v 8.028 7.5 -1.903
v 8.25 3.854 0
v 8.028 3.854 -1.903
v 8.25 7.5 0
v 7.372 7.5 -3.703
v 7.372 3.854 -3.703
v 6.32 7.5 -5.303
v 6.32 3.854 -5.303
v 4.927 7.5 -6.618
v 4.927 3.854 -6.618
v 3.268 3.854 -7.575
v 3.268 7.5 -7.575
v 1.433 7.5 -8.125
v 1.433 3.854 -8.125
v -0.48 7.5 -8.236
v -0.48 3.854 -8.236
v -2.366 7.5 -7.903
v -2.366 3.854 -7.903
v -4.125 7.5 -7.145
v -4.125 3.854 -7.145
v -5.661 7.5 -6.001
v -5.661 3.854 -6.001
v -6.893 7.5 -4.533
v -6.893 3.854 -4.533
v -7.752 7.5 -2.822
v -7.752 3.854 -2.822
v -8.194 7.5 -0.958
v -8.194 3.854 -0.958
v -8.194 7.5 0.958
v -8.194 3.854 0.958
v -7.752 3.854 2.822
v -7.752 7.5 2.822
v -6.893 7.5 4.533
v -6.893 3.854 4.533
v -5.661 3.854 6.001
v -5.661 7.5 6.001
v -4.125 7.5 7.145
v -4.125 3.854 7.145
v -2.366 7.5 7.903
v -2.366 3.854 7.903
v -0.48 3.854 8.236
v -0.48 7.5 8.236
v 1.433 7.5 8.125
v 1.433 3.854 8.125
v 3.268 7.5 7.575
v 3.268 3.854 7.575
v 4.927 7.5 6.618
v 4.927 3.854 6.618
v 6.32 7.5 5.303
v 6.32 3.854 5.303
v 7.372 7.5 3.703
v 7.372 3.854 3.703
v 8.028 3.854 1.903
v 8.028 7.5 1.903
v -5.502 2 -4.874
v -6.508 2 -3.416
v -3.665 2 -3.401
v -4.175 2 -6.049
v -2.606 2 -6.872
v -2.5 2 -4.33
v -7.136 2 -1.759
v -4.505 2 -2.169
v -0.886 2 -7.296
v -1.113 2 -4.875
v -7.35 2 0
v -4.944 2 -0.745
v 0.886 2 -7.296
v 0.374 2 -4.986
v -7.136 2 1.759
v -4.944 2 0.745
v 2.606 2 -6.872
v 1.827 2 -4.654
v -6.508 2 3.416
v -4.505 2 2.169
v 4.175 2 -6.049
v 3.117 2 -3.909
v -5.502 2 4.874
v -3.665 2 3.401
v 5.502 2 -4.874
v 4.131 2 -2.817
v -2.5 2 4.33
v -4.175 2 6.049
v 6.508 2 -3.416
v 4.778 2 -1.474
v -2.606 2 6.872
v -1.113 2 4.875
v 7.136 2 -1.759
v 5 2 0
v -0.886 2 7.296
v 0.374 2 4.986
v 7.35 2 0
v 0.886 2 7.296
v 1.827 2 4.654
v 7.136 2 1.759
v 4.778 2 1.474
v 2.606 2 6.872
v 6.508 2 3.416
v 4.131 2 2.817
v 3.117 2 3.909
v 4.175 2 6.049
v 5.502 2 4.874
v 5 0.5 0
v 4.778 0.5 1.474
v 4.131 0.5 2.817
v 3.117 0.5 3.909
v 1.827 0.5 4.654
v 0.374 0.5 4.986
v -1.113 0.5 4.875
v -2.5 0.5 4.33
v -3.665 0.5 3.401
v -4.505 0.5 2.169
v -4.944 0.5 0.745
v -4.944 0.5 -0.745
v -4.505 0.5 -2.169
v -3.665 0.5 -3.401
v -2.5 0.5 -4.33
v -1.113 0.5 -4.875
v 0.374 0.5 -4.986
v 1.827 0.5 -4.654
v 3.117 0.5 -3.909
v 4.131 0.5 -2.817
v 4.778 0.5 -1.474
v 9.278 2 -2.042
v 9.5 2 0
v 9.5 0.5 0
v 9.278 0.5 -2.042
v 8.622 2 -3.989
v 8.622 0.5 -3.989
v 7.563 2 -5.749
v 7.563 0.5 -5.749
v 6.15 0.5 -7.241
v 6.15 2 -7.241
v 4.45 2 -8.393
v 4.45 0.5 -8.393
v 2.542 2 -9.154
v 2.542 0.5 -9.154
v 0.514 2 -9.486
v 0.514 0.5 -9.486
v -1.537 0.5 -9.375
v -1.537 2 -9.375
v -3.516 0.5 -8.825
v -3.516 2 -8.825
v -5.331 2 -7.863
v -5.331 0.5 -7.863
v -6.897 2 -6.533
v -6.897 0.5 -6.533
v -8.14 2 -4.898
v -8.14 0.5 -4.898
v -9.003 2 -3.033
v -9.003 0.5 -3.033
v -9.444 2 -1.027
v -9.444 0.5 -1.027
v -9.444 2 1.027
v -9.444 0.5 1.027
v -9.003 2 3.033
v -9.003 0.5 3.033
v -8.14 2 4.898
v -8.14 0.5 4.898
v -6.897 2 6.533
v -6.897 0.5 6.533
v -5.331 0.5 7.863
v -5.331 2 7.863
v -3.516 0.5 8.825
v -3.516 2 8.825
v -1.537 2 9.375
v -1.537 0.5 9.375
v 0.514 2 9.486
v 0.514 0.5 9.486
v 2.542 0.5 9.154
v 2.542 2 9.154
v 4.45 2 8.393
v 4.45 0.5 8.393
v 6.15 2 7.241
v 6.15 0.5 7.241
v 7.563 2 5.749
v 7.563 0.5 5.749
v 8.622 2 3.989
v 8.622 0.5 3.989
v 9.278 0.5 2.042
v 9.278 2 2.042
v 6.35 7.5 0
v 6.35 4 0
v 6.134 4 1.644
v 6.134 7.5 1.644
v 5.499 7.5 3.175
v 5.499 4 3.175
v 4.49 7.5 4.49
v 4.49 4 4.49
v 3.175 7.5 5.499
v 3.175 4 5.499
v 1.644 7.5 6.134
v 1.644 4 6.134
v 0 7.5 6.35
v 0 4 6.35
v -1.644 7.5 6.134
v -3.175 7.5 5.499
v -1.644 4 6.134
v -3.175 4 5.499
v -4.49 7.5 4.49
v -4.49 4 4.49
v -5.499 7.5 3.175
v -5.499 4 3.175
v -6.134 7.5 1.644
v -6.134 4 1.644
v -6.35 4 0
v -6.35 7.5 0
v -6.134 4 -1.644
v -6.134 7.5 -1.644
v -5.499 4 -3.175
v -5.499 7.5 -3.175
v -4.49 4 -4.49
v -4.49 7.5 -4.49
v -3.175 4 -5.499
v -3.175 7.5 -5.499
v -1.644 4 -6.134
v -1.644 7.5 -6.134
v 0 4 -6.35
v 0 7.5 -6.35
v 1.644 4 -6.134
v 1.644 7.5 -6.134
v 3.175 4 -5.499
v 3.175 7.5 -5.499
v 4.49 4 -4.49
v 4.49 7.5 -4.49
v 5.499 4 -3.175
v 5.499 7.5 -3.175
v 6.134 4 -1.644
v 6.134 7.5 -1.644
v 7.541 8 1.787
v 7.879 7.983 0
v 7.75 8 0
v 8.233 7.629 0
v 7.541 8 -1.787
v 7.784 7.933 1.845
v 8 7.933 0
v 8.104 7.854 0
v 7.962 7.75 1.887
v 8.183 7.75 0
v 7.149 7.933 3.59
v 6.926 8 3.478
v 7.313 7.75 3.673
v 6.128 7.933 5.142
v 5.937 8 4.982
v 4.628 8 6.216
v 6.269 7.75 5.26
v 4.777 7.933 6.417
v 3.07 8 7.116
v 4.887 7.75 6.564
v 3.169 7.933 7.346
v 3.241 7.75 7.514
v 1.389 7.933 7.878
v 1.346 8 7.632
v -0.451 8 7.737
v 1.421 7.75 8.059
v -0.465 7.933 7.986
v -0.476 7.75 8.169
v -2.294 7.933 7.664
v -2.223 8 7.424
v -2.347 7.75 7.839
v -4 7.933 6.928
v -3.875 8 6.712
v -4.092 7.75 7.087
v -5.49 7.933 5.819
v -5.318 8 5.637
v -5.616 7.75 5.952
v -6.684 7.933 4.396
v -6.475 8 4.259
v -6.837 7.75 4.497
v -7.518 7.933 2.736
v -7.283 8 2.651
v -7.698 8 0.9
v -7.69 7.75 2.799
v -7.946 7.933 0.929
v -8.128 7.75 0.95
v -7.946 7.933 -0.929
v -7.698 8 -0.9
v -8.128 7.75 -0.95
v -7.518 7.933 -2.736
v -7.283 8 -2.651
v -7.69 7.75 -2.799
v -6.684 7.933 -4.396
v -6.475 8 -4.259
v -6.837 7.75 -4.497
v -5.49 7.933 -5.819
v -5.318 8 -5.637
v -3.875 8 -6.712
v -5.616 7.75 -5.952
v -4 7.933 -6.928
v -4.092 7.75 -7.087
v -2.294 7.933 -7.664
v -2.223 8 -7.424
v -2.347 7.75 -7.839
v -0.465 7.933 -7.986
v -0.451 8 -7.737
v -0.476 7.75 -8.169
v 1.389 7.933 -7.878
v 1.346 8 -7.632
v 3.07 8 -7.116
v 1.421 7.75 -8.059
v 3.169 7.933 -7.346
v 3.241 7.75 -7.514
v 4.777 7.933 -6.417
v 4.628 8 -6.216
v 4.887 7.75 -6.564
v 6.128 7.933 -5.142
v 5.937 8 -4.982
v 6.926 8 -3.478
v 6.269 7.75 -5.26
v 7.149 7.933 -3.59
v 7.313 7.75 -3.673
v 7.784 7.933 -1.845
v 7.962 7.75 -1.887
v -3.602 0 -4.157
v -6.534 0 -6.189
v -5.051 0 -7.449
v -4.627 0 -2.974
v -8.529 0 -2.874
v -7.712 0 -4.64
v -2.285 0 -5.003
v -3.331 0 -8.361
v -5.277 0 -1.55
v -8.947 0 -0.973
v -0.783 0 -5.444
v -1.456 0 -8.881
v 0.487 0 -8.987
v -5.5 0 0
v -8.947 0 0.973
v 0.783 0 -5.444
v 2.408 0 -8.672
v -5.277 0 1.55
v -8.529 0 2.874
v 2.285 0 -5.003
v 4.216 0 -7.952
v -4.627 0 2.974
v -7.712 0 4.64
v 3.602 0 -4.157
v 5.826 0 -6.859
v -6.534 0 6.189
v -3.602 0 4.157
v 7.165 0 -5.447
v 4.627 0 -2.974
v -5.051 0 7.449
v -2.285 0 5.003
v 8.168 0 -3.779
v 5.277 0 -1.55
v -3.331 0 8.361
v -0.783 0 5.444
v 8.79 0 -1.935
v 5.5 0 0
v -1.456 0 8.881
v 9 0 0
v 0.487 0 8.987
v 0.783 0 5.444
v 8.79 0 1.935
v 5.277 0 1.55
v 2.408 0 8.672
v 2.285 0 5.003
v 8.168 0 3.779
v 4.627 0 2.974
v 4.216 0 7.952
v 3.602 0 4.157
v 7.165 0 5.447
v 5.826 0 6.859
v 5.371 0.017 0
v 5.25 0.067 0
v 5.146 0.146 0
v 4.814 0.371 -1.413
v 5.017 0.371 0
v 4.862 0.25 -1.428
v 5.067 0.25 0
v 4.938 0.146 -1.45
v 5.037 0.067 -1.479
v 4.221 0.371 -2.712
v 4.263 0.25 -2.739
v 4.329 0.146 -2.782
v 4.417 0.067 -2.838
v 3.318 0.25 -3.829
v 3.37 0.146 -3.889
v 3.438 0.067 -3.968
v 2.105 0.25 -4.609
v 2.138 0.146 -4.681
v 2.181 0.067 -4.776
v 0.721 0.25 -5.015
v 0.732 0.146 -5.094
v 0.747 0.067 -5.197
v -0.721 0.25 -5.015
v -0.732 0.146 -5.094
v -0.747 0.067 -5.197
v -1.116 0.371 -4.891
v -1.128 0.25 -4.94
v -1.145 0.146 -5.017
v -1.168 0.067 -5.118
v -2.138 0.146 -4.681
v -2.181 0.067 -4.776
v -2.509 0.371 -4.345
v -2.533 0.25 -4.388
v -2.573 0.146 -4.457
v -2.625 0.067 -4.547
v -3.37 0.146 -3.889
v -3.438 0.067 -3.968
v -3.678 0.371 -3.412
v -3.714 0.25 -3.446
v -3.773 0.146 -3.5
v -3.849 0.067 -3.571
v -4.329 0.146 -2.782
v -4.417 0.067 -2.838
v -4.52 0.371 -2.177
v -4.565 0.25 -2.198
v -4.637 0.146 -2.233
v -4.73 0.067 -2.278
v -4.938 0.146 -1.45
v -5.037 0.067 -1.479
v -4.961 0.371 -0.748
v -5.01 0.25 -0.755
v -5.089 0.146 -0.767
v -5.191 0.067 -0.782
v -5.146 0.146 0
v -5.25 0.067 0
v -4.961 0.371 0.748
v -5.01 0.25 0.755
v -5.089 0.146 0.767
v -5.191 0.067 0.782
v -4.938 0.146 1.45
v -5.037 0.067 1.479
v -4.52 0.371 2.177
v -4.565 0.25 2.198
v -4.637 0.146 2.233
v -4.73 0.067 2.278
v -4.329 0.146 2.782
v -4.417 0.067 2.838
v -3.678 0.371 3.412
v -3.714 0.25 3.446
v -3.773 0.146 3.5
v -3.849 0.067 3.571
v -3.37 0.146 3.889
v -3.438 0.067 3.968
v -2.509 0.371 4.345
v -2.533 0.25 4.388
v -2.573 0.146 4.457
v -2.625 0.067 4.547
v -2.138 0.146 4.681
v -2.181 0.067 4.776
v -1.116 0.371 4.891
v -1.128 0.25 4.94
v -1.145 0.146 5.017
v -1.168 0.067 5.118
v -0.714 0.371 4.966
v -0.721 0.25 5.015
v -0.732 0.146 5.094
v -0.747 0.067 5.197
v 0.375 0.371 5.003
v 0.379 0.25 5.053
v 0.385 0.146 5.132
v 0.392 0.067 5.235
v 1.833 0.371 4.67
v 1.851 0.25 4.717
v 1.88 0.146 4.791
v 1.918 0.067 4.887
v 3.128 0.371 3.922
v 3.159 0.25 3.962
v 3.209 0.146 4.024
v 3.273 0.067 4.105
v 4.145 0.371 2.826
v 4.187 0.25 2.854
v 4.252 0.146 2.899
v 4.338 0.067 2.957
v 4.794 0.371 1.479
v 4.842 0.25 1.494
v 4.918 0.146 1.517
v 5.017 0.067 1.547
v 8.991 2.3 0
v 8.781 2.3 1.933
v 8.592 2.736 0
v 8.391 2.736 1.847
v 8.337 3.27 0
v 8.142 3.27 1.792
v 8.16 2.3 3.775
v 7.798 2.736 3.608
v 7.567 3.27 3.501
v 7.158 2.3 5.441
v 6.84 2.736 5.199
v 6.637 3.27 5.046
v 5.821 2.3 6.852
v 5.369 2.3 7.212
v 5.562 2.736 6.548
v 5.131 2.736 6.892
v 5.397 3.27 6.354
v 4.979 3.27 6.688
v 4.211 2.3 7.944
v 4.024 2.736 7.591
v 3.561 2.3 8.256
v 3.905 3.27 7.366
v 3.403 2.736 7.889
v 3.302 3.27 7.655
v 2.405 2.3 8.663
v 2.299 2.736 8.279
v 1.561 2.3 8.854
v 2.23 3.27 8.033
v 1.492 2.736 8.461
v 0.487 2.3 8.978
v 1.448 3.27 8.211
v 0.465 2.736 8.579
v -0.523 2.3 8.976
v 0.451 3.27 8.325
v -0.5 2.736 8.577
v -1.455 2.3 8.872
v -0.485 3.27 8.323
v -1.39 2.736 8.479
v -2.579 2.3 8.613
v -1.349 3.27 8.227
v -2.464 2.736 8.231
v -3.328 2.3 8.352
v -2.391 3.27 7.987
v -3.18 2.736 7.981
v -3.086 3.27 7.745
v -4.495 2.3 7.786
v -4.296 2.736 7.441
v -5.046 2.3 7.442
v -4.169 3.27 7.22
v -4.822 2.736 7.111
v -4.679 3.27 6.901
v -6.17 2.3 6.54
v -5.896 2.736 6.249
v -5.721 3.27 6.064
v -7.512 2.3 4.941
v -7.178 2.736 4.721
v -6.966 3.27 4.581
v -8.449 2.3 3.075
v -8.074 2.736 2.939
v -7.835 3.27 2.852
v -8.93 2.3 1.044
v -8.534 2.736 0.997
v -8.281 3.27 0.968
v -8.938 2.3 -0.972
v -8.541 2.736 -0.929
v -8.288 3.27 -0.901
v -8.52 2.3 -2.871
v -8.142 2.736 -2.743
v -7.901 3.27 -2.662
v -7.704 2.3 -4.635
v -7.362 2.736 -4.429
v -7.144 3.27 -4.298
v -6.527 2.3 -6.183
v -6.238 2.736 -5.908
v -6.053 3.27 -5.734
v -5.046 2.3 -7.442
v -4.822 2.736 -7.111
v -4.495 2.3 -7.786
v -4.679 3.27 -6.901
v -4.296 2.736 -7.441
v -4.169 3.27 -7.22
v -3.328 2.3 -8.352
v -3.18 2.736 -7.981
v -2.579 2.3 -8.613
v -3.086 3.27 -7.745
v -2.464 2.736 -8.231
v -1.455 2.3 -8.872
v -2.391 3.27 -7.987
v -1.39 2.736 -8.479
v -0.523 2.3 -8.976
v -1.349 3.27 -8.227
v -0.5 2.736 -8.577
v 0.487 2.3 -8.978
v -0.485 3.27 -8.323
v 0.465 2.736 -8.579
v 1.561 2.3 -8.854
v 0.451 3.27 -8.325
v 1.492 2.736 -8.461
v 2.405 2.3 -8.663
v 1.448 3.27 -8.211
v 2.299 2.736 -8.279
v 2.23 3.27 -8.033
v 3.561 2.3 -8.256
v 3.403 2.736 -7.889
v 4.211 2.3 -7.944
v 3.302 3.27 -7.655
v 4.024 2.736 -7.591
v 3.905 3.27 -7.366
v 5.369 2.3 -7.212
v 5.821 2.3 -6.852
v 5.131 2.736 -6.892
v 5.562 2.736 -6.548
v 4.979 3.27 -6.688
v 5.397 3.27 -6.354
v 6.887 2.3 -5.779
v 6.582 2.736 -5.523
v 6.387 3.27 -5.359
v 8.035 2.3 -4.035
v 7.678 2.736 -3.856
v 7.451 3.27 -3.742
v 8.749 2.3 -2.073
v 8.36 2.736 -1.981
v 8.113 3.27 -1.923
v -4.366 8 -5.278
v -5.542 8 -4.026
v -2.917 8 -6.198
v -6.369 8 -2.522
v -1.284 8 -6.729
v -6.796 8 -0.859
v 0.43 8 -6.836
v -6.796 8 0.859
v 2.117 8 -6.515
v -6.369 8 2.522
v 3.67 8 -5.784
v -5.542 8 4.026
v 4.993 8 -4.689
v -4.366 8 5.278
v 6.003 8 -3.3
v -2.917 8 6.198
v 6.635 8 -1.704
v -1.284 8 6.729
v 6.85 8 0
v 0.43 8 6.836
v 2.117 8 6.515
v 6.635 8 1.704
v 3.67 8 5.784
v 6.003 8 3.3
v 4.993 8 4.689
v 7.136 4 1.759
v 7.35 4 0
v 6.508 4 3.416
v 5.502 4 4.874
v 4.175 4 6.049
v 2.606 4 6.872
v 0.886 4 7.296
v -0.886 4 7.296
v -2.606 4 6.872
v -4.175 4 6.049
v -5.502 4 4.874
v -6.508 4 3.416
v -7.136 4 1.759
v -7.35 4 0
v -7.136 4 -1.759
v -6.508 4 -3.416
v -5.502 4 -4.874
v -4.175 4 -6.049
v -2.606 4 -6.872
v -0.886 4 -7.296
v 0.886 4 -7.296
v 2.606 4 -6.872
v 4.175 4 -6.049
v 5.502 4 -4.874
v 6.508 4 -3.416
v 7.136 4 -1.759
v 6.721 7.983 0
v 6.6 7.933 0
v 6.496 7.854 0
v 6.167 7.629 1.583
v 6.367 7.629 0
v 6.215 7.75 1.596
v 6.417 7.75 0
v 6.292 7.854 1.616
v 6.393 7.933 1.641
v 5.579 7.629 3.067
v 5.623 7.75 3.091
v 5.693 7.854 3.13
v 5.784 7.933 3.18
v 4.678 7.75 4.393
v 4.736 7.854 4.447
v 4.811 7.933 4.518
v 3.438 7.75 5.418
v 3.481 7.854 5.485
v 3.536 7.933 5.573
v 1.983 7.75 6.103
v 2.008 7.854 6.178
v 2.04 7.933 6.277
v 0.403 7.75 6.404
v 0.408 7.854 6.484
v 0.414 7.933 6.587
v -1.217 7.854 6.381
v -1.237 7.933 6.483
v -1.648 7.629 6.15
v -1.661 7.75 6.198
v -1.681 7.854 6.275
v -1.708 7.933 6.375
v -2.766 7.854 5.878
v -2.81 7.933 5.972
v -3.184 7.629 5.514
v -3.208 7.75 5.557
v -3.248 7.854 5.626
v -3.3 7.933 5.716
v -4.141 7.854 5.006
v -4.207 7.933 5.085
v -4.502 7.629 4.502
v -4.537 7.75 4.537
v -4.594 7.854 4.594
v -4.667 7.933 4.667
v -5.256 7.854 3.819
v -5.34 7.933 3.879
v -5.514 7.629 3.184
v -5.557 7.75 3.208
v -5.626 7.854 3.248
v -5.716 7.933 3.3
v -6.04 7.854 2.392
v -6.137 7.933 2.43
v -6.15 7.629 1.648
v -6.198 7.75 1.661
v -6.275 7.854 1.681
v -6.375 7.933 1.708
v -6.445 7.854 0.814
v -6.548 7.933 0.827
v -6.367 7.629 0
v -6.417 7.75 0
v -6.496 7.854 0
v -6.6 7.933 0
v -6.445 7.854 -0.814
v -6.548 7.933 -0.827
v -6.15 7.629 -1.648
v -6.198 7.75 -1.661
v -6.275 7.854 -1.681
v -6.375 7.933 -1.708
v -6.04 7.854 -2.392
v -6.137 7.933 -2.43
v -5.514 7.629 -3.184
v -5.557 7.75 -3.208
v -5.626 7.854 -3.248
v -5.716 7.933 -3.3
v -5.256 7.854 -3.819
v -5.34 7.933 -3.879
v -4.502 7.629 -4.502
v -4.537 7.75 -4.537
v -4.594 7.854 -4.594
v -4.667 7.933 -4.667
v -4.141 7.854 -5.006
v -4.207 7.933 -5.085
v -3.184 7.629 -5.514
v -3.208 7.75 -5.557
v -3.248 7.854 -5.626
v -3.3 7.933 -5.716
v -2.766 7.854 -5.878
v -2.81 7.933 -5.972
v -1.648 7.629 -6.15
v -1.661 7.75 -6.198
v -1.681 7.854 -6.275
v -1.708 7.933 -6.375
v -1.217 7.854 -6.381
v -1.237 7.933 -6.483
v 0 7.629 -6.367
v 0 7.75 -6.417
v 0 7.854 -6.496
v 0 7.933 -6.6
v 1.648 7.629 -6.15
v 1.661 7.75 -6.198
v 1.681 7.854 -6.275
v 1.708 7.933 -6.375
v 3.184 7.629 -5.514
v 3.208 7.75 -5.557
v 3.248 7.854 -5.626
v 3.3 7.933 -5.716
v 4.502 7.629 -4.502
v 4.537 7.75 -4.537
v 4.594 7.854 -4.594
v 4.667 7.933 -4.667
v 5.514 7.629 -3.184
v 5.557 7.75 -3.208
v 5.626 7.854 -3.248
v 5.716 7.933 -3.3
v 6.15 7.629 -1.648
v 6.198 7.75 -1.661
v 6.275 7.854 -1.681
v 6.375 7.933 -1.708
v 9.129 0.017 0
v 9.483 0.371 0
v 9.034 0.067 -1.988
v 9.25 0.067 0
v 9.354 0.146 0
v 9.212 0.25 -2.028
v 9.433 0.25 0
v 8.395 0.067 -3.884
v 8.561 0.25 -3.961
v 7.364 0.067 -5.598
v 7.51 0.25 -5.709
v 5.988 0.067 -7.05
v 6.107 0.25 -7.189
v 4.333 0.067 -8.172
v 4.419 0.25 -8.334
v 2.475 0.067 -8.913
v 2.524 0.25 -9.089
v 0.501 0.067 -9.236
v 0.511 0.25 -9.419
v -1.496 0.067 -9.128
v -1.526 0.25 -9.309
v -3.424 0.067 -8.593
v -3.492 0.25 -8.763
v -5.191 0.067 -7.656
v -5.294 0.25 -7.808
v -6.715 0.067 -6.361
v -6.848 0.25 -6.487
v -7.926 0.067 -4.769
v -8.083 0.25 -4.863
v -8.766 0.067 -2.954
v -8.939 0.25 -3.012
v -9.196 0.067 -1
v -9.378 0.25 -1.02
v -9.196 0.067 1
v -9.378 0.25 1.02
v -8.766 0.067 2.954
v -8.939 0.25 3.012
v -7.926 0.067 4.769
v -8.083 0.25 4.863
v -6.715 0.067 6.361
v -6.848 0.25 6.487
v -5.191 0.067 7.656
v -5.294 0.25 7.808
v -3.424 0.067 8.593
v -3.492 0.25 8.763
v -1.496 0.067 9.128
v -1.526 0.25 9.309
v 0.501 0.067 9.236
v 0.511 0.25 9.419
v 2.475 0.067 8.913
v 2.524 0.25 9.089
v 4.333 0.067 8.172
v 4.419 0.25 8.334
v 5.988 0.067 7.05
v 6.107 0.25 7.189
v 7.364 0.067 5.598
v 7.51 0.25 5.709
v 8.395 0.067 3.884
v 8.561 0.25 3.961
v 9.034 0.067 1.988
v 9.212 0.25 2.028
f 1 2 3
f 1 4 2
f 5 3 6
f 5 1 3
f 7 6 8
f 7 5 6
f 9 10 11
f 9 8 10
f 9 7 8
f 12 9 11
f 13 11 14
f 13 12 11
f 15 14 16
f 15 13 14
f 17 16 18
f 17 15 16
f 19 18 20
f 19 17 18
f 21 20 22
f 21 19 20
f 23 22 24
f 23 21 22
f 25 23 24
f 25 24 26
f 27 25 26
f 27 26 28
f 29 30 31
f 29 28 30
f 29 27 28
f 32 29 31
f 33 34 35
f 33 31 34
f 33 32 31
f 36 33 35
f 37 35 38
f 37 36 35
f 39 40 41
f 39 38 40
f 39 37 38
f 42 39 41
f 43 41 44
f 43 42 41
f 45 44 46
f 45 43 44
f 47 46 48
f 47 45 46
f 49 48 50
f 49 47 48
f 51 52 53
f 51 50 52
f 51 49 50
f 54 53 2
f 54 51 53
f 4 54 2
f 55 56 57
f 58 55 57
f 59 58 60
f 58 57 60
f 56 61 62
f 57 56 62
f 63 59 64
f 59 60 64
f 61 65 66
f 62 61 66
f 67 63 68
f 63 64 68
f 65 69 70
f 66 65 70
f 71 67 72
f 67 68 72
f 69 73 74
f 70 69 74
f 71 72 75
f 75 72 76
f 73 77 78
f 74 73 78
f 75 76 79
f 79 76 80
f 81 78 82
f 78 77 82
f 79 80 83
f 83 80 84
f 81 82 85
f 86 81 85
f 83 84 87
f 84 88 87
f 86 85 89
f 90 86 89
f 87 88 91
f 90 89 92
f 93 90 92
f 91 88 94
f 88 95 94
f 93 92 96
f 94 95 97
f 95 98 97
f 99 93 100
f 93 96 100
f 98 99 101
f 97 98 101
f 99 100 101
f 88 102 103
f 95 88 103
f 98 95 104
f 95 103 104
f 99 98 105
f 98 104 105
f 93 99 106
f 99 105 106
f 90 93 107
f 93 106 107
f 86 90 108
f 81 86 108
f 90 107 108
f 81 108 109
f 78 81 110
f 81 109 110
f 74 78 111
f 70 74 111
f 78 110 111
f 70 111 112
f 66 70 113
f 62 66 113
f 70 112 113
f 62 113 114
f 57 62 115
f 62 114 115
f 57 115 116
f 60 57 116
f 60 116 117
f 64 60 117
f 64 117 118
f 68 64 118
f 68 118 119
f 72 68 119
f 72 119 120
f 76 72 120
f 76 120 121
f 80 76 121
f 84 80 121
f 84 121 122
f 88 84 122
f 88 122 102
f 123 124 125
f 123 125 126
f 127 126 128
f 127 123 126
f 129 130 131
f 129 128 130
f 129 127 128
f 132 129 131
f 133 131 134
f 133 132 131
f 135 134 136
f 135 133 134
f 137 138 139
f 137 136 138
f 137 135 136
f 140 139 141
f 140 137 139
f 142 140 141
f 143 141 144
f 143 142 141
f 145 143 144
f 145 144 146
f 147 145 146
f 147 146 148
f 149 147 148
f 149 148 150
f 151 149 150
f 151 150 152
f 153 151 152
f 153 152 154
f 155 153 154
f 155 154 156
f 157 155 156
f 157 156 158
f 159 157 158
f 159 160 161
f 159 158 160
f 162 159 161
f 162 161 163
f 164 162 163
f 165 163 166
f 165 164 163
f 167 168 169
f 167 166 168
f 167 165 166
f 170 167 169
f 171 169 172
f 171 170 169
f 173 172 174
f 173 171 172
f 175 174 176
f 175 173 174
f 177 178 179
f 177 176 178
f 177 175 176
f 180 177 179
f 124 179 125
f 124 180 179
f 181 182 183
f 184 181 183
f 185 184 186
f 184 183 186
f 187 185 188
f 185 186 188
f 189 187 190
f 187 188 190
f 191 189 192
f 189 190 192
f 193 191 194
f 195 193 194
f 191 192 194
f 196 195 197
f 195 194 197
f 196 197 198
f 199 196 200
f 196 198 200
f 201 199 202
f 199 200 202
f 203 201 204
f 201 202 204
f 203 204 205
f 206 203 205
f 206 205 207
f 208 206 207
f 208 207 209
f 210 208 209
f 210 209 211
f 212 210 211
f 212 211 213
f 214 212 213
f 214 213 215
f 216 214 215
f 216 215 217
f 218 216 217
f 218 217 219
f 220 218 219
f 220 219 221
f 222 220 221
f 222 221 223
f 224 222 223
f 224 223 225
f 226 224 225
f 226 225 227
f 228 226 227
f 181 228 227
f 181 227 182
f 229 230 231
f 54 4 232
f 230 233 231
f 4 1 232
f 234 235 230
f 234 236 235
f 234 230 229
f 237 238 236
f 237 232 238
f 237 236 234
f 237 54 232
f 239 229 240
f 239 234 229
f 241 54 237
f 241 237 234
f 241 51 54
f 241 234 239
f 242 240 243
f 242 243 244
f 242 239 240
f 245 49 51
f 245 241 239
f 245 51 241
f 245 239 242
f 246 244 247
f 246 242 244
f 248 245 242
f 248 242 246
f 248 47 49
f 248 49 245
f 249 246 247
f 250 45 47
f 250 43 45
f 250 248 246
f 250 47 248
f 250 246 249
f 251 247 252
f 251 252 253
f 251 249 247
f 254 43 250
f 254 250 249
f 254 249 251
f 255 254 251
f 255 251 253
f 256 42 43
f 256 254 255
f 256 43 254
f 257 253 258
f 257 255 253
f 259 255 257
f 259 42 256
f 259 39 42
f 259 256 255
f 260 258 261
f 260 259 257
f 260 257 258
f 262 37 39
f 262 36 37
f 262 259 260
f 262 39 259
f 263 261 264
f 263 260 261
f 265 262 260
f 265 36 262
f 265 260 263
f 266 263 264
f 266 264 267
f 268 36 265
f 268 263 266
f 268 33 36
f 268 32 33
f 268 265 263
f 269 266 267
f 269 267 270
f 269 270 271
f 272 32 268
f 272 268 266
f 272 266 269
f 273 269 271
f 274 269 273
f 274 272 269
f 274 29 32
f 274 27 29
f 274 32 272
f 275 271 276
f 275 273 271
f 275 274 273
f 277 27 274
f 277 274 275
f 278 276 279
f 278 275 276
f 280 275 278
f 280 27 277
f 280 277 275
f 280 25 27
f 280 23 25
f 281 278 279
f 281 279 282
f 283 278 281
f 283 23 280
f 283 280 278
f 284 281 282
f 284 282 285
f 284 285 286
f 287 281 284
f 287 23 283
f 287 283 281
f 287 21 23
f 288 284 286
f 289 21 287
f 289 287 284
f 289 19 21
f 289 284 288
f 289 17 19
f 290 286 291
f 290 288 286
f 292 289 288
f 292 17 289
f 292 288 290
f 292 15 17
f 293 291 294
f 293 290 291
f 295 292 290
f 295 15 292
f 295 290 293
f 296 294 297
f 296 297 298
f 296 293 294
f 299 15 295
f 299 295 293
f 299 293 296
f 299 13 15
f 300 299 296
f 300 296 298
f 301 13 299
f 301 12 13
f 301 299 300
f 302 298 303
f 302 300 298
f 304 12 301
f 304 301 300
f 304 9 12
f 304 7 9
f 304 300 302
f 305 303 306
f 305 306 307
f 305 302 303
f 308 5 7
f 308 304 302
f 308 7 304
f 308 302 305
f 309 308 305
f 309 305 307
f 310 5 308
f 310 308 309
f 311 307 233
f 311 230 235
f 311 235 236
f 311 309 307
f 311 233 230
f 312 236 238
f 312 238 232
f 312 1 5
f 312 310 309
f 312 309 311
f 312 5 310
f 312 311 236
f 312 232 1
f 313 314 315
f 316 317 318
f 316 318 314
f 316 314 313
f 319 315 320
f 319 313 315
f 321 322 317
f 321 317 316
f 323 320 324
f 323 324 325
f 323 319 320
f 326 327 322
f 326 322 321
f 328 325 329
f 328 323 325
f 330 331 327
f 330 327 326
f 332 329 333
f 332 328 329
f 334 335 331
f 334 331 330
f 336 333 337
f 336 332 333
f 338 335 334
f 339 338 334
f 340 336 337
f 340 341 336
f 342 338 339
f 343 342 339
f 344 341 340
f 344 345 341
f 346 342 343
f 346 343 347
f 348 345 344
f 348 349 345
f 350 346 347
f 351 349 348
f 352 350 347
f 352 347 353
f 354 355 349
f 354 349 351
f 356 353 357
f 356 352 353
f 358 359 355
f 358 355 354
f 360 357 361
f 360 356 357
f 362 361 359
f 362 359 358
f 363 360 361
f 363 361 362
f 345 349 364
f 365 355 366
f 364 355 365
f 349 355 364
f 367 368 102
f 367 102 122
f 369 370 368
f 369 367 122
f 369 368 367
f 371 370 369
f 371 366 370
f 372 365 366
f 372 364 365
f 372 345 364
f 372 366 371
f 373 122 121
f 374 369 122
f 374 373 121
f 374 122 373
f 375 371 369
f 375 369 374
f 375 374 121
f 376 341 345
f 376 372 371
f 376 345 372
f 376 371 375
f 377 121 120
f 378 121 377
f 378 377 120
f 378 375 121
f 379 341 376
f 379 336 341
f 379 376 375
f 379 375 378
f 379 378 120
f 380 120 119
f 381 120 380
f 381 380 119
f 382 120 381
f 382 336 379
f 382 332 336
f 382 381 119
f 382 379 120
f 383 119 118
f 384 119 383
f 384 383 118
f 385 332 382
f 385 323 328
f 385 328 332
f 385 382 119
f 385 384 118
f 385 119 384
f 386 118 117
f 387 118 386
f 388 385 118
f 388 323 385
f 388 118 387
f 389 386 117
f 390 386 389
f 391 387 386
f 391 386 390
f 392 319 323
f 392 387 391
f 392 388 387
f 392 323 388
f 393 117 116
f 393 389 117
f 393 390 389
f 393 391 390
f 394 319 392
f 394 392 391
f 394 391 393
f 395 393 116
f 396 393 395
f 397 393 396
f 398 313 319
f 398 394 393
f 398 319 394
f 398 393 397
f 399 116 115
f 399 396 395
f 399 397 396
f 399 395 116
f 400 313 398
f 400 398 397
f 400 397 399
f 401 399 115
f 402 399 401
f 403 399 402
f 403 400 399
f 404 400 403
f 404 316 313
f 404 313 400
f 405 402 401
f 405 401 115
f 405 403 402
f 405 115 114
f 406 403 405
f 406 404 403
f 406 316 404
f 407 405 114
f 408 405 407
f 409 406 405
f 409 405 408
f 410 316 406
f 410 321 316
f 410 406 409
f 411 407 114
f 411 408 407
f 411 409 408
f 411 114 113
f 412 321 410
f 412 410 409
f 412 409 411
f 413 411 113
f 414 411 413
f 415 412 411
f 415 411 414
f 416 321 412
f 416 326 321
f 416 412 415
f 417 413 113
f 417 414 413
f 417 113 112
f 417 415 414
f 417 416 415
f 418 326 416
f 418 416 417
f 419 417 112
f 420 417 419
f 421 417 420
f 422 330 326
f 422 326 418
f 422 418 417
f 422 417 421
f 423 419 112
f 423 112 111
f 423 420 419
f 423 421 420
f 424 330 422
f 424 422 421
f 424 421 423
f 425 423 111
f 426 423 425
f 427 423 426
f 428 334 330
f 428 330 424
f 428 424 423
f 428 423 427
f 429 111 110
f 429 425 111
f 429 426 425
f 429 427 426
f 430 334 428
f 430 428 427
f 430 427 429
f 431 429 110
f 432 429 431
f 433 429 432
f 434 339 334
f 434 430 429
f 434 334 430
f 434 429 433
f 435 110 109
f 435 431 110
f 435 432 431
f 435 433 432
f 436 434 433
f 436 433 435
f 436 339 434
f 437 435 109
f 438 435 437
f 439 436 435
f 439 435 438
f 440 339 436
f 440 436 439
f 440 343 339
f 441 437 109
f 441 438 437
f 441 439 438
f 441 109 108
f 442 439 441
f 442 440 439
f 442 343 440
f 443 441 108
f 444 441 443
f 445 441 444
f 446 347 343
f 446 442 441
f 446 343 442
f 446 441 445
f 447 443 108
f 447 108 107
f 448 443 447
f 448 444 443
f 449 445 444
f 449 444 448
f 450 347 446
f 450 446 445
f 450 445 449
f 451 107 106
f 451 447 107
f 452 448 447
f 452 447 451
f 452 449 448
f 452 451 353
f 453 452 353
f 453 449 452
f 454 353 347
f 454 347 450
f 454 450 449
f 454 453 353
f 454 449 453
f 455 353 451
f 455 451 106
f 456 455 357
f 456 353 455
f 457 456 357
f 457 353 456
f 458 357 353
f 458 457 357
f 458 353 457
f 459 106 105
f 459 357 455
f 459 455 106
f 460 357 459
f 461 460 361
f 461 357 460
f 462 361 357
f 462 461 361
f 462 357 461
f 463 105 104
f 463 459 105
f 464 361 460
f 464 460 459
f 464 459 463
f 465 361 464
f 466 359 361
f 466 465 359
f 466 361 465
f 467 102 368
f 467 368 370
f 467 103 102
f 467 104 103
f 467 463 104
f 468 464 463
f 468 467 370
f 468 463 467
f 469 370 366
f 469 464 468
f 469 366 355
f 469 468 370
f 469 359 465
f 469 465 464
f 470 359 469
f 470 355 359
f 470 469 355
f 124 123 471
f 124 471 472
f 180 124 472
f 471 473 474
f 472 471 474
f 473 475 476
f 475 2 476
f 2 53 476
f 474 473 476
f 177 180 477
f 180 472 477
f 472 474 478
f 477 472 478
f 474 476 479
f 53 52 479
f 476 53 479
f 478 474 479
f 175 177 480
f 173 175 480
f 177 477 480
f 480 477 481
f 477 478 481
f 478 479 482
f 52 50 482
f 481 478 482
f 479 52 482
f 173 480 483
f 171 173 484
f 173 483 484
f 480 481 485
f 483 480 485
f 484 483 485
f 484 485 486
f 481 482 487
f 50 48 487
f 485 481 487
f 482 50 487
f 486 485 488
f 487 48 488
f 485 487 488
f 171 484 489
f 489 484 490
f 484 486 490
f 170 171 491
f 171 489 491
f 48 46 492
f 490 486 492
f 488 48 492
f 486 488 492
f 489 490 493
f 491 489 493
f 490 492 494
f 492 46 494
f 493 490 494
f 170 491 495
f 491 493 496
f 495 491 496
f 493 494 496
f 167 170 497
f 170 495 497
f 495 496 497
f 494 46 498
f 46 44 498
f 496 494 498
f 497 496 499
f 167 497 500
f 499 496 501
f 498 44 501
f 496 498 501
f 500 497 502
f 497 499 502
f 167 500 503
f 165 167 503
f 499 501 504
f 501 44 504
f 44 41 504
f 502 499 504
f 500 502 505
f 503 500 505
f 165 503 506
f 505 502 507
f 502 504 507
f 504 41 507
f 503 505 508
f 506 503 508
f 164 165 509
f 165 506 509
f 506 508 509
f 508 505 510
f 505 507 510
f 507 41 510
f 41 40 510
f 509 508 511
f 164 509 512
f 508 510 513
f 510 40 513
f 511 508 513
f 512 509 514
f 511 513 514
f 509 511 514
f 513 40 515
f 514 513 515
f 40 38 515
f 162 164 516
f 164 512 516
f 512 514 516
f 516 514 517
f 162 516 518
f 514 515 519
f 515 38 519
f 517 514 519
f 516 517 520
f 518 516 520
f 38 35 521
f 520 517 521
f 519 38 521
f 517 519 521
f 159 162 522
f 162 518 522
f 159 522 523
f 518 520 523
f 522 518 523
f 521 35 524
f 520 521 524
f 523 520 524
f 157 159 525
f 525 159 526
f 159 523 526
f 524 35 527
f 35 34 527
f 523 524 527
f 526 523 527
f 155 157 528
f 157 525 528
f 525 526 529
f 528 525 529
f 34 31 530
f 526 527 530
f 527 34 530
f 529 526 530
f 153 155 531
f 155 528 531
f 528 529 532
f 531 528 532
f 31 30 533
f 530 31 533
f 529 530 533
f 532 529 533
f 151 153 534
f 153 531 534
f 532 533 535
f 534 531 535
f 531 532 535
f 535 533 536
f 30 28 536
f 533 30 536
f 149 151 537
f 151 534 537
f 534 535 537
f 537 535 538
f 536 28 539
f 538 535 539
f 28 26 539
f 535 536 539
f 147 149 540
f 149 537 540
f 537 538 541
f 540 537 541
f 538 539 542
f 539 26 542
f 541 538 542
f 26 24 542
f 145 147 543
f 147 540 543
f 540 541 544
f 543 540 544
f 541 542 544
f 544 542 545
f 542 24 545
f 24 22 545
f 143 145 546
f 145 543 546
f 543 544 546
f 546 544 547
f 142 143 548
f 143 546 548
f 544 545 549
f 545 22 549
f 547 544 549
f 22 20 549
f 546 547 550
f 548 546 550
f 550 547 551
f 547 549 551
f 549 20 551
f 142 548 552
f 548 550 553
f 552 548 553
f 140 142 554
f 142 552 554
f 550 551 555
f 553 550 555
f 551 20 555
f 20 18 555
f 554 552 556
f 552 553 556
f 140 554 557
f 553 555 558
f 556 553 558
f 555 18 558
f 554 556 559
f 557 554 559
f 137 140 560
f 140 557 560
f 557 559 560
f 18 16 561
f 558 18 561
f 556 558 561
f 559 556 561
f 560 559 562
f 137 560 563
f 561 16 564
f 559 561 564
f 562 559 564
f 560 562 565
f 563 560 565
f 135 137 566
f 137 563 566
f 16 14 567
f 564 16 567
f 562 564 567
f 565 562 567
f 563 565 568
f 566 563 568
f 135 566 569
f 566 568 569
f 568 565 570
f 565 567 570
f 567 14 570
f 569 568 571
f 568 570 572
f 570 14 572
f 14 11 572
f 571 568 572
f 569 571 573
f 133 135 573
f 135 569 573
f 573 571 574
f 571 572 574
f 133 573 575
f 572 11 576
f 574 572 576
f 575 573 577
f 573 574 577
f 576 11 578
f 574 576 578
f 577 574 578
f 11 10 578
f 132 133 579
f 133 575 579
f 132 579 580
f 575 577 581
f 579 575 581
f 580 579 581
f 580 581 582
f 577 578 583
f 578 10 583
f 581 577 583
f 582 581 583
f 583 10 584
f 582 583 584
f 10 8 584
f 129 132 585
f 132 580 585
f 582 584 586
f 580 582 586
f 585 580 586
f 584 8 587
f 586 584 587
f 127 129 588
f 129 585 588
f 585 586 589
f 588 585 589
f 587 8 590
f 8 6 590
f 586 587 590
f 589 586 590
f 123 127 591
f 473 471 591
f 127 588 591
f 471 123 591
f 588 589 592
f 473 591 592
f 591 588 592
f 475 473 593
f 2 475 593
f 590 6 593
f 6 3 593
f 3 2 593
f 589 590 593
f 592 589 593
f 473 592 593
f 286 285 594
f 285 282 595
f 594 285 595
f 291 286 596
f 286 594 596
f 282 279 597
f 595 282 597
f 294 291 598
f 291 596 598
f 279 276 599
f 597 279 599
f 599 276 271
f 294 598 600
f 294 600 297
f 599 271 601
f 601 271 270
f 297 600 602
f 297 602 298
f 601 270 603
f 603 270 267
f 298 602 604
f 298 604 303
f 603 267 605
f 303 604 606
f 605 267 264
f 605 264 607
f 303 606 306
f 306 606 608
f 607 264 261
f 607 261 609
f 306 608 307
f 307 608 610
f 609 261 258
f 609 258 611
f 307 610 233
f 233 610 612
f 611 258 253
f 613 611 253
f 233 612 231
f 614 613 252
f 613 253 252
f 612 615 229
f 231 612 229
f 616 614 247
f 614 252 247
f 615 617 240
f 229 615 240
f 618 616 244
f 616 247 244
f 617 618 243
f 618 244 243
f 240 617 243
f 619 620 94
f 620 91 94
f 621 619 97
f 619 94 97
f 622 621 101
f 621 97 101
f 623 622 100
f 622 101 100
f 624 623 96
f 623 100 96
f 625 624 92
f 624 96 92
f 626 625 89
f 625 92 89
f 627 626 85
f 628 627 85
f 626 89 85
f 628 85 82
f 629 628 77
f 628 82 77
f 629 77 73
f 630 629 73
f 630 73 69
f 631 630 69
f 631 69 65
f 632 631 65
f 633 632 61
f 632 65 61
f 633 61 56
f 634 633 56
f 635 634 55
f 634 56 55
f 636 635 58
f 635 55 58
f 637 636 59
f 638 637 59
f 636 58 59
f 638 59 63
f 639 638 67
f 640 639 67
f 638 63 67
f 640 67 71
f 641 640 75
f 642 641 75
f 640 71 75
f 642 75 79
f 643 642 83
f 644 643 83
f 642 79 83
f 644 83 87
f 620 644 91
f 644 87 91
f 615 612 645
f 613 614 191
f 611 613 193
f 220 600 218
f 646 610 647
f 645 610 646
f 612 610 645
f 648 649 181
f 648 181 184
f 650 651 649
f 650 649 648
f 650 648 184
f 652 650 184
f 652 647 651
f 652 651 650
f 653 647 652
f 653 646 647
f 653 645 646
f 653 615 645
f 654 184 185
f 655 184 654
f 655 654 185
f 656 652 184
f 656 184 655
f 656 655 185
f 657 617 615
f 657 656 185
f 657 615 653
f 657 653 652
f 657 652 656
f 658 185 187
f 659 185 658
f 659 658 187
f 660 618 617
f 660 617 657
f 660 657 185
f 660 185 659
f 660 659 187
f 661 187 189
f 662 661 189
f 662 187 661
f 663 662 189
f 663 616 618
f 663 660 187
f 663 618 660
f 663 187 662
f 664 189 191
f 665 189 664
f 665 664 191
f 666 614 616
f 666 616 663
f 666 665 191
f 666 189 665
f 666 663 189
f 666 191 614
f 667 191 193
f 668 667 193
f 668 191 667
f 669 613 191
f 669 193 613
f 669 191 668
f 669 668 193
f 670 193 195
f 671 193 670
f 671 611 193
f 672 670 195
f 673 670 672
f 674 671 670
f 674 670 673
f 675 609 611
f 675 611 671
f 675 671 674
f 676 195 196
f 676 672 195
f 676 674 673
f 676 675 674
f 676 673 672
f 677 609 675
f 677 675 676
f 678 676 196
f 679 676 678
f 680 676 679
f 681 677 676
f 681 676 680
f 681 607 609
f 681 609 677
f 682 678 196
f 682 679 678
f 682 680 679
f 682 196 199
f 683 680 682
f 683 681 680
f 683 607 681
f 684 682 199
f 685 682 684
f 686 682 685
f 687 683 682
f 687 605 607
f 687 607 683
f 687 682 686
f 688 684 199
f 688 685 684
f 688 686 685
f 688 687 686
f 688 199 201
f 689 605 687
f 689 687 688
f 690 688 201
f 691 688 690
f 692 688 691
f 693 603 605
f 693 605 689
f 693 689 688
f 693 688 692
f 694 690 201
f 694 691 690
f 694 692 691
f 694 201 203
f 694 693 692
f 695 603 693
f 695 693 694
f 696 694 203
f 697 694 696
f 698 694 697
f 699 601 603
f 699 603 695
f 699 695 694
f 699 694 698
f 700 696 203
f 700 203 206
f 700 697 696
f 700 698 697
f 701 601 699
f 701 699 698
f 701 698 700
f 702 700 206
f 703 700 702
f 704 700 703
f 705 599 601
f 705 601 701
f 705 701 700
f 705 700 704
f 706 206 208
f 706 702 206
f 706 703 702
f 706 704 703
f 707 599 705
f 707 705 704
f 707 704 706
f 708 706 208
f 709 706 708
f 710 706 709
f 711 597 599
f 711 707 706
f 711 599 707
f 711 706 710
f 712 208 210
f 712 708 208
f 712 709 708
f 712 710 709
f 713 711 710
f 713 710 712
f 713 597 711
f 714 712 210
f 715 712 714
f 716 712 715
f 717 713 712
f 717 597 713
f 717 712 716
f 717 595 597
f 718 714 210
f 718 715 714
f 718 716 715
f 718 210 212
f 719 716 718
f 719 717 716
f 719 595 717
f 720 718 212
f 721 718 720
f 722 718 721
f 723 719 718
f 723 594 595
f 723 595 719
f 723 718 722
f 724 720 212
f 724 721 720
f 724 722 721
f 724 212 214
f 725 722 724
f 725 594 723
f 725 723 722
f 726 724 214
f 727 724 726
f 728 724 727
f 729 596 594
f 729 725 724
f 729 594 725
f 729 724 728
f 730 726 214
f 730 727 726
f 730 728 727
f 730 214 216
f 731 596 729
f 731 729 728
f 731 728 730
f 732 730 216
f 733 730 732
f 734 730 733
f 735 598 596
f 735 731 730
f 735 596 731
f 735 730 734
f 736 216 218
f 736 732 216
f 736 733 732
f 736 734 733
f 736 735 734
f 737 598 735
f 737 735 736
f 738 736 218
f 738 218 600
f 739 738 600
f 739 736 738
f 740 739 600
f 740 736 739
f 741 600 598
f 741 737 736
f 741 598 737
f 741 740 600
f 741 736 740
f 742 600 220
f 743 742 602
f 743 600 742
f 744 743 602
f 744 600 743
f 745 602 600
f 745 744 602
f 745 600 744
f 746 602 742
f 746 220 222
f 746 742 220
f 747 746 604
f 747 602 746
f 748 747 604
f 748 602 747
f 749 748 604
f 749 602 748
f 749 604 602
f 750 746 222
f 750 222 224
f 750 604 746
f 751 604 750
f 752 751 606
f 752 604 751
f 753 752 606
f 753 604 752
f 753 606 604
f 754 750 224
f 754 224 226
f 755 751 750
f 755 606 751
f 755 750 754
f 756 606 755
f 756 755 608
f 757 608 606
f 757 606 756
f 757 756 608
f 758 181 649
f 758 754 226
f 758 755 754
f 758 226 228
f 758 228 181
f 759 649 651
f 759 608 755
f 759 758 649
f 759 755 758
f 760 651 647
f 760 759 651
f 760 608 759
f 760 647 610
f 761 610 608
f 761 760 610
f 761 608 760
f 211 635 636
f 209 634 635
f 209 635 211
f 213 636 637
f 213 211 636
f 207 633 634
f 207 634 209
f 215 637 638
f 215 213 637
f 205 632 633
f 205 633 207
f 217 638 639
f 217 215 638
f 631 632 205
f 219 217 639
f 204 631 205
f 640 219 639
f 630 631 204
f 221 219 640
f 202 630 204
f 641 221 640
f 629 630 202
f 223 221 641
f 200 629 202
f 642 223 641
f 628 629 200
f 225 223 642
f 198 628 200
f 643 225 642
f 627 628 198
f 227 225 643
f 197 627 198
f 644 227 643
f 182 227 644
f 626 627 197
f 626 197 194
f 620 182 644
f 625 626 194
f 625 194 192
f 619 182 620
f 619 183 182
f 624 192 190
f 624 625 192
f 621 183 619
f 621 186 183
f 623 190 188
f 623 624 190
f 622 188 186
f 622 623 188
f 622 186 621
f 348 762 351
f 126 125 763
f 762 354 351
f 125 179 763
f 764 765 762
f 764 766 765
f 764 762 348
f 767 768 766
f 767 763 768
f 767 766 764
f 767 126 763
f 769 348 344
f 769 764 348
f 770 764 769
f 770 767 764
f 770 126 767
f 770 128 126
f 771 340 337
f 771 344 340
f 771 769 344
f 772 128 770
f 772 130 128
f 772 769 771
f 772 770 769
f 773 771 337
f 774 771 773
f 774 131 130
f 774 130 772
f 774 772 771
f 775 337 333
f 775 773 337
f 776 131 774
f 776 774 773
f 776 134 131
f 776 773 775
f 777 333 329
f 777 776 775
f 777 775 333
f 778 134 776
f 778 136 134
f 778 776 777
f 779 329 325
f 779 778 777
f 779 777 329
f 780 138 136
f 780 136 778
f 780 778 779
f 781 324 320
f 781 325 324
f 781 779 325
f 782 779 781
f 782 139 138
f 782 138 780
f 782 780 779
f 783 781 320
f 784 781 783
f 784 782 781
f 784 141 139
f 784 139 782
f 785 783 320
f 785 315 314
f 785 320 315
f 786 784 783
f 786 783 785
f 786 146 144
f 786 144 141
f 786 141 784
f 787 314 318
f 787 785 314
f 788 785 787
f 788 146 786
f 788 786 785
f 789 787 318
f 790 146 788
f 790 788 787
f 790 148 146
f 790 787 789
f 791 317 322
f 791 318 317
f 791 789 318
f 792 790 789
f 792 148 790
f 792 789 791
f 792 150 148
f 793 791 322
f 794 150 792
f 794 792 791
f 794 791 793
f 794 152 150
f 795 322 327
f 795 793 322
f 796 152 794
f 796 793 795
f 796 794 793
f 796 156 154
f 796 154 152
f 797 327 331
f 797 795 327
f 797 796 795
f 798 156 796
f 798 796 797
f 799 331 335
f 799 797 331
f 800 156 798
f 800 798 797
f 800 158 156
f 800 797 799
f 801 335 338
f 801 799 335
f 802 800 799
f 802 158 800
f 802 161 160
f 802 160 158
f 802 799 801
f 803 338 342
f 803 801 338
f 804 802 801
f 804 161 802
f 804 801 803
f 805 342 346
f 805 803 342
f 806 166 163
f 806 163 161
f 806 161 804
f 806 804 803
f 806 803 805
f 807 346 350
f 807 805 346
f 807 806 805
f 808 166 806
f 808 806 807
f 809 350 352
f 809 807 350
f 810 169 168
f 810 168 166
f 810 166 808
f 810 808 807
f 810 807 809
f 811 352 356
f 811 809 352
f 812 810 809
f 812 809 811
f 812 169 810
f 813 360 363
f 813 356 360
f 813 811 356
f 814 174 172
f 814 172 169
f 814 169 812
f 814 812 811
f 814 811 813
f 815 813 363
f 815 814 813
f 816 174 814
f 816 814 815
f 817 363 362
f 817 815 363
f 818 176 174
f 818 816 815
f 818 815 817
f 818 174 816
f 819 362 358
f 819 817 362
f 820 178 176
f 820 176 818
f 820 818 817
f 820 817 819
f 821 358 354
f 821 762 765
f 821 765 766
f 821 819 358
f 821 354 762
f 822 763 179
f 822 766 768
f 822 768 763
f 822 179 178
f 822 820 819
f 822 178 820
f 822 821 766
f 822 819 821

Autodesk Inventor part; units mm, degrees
ref_plane "YZ Plane" through (0, 0, 0) normal (1, 0, 0) x (0, 1, 0)
ref_plane "XZ Plane" through (0, 0, 0) normal (0, 1, 0) x (-1, 0, 0)
ref_plane "XY Plane" through (0, 0, 0) normal (0, 0, 1) x (1, 0, 0)
sketch "Sketch1" plane through (0, 0, 0) normal (0, 0, 1) x (1, 0, 0)
  line L0 (0, 10.7366) -> (0, -7.1166)
  line L1 (0, 0) -> (9.5, 0)
  line L2 (9.5, 0) -> (9.5, 2)
  line L3 (9.5, 2) -> (8.25, 2)
  line L4 (8.25, 2) -> (8.25, 8)
  line L5 (8.25, 8) -> (6.35, 8)
  line L6 (6.35, 8) -> (6.35, 2)
  line L7 (6.35, 2) -> (0, 2)
  dimension "d0" = 19
  dimension "d1" = 12.7
  dimension "d2" = 1.9
  dimension "d3" = 2
  dimension "d6" = 6
revolve "Revolution1" add sketch "Sketch1" angle 360 about axis through (0, 10.7366, 0) along (0, -1, 0)
sketch "Sketch2" plane through (0, 0, 0) normal (0, 0, 1) x (1, 0, 0)
  line L0 (6.1122, 2) -> (7.35, 2)
  line L1 (8.25, 8) -> (8.25, 2)
  line L2 (7.35, 4) -> (6.1122, 4)
  line L3 (6.1122, 4) -> (6.1122, 2)
  line L4 (8.25, 3) -> (8.25, 4)
  line L5 (-8.25, 8) -> (8.25, 8) projected
  line L6 (0, 5.3477) -> (0, 2.8187)
  line L7 (7.35, 4) -> (7.35, 2)
  point P0 (0, 0)
  dimension "d7" = 4
  dimension "d8" = 2
  dimension "d9" = 14.7
revolve "Revolution2" cut sketch "Sketch2" angle 360 about axis through (0, 5.3477, 0) along (0, -1, 0)
sketch "Sketch3" plane through (0, 0, 0) normal (0, -1, 0) x (1, 0, 0)
  circle A0 centre (0, 0) radius 5
  dimension "d11" = 10
extrude "Extrusion1" cut sketch "Sketch3" against normal up to surface (2 mm away)
fillet "Fillet1" radius 2 1 edges at (-8.25, 2, 0)
fillet "Fillet2" radius 0.5 2 edges at (-6.35, 8, 0) (-8.25, 8, 0)
fillet "Fillet3" radius 0.5 2 edges at (-9.5, 0, 0) (-5, 0, 0)
properties part number "çıkçıkkarşılıkk"
